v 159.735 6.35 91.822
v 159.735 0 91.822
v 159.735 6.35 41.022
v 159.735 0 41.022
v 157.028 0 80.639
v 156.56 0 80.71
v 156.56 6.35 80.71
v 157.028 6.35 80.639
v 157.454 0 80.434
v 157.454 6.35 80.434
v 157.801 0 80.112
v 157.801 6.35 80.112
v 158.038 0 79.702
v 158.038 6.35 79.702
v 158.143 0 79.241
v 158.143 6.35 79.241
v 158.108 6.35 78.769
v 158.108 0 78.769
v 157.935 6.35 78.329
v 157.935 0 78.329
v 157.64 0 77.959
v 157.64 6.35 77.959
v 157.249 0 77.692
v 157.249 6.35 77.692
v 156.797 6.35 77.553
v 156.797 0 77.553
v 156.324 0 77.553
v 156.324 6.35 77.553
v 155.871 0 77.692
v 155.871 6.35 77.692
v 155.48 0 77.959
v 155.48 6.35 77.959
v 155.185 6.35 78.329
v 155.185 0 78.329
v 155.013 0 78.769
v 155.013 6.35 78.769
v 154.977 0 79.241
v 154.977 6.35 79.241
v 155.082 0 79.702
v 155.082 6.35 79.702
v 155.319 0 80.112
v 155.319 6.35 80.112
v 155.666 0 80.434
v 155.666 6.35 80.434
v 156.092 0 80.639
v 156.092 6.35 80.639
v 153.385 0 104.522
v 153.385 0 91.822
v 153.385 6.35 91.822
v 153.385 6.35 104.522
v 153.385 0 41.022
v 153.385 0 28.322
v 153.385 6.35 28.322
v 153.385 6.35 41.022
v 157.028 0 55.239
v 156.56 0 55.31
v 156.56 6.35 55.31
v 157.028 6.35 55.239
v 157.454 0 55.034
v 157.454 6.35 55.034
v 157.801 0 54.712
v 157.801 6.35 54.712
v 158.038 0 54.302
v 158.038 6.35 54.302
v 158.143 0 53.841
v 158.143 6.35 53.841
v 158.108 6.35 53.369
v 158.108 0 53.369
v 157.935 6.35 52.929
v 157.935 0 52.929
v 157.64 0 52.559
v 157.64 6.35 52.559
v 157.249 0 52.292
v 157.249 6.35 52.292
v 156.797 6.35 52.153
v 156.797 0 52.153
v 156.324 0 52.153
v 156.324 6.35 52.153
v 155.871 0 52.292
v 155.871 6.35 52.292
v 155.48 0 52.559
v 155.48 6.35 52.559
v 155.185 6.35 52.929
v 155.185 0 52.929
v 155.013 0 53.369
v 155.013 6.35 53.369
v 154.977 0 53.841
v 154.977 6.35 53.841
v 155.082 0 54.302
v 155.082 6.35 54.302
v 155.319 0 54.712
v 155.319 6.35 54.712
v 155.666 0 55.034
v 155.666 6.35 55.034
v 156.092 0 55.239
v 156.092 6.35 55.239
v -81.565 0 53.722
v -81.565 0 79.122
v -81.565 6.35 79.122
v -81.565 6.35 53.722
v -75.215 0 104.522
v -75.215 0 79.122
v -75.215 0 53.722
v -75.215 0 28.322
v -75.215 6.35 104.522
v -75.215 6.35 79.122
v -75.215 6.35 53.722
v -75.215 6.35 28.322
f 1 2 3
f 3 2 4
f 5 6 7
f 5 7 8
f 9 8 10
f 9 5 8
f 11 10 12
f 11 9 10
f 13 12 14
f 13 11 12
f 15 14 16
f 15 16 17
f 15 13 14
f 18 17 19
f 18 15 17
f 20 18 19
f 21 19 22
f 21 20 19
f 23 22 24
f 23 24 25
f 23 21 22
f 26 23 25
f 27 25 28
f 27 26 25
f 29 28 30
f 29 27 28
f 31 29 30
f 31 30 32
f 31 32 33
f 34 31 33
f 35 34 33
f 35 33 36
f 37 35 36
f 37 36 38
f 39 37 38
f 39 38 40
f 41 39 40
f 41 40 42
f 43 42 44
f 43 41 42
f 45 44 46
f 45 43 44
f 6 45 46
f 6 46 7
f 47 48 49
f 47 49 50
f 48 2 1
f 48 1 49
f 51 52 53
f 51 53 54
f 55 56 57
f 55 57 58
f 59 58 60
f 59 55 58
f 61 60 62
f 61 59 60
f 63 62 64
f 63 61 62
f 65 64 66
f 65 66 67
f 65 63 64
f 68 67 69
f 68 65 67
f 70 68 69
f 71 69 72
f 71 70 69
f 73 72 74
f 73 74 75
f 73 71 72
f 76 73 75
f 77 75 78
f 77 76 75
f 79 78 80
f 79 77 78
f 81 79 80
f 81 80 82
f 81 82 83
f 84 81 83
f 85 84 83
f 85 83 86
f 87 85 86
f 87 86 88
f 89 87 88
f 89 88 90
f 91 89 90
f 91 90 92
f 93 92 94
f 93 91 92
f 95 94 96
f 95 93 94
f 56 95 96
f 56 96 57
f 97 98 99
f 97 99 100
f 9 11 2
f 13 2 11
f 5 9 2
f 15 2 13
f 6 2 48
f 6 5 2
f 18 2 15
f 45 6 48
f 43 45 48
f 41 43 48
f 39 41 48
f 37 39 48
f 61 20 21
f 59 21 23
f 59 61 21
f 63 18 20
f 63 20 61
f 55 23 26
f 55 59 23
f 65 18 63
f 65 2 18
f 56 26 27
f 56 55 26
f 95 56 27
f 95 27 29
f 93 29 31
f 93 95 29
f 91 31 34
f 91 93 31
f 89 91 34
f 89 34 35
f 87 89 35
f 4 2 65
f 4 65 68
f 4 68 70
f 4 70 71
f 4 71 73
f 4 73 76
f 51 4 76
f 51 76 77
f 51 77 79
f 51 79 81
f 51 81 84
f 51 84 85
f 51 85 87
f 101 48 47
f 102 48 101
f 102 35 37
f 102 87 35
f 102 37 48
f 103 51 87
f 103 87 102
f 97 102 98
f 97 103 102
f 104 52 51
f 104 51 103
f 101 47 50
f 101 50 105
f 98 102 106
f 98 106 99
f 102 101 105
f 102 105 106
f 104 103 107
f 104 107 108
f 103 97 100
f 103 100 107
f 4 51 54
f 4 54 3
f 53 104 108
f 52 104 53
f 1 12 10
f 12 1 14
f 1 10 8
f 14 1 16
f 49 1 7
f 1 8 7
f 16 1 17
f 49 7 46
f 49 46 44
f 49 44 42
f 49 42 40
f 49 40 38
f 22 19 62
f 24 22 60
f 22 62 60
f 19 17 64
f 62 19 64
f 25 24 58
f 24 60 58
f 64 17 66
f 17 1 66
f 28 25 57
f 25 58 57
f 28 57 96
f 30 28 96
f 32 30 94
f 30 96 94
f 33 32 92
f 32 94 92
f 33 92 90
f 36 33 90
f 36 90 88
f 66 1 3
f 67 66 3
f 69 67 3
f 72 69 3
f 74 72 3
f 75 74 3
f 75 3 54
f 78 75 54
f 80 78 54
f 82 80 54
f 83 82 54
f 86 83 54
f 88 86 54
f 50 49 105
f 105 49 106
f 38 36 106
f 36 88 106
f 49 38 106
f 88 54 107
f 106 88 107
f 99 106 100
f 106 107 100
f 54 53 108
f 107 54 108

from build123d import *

# Parameters (mm, degrees)
SKETCH1_R           = 1.5875
BOSS_EXTRUDE1_DEPTH = 6.35


with BuildPart() as part:
    # Sketch1 → Boss-Extrude1 (new body)
    with BuildSketch(Plane(origin=(0, 0, 0), x_dir=(1, 0, 0), z_dir=(0, 1, 0))):
        Polygon((-75.214775388, -28.322289224), (153.385224612, -28.322289224), (153.385224612, -41.022289224), (159.735224612, -41.022289224), (159.735224612, -66.422289224), (159.735224612, -91.822289224), (153.385224612, -91.822289224), (153.385224612, -104.522289224), (-75.214775388, -104.522289224), (-75.214775388, -79.122289224), (-81.564775388, -79.122289224), (-81.564775388, -53.722289224), (-75.214775388, -53.722289224), align=None)
        with Locations(Location((156.560224612, -53.722289224, 0), (0, 0, 270))):
            Circle(SKETCH1_R, mode=Mode.SUBTRACT)
        with Locations(Location((156.560224612, -79.122289224, 0), (0, 0, 270))):
            Circle(SKETCH1_R, mode=Mode.SUBTRACT)
    extrude(amount=BOSS_EXTRUDE1_DEPTH)


solid = part.part
